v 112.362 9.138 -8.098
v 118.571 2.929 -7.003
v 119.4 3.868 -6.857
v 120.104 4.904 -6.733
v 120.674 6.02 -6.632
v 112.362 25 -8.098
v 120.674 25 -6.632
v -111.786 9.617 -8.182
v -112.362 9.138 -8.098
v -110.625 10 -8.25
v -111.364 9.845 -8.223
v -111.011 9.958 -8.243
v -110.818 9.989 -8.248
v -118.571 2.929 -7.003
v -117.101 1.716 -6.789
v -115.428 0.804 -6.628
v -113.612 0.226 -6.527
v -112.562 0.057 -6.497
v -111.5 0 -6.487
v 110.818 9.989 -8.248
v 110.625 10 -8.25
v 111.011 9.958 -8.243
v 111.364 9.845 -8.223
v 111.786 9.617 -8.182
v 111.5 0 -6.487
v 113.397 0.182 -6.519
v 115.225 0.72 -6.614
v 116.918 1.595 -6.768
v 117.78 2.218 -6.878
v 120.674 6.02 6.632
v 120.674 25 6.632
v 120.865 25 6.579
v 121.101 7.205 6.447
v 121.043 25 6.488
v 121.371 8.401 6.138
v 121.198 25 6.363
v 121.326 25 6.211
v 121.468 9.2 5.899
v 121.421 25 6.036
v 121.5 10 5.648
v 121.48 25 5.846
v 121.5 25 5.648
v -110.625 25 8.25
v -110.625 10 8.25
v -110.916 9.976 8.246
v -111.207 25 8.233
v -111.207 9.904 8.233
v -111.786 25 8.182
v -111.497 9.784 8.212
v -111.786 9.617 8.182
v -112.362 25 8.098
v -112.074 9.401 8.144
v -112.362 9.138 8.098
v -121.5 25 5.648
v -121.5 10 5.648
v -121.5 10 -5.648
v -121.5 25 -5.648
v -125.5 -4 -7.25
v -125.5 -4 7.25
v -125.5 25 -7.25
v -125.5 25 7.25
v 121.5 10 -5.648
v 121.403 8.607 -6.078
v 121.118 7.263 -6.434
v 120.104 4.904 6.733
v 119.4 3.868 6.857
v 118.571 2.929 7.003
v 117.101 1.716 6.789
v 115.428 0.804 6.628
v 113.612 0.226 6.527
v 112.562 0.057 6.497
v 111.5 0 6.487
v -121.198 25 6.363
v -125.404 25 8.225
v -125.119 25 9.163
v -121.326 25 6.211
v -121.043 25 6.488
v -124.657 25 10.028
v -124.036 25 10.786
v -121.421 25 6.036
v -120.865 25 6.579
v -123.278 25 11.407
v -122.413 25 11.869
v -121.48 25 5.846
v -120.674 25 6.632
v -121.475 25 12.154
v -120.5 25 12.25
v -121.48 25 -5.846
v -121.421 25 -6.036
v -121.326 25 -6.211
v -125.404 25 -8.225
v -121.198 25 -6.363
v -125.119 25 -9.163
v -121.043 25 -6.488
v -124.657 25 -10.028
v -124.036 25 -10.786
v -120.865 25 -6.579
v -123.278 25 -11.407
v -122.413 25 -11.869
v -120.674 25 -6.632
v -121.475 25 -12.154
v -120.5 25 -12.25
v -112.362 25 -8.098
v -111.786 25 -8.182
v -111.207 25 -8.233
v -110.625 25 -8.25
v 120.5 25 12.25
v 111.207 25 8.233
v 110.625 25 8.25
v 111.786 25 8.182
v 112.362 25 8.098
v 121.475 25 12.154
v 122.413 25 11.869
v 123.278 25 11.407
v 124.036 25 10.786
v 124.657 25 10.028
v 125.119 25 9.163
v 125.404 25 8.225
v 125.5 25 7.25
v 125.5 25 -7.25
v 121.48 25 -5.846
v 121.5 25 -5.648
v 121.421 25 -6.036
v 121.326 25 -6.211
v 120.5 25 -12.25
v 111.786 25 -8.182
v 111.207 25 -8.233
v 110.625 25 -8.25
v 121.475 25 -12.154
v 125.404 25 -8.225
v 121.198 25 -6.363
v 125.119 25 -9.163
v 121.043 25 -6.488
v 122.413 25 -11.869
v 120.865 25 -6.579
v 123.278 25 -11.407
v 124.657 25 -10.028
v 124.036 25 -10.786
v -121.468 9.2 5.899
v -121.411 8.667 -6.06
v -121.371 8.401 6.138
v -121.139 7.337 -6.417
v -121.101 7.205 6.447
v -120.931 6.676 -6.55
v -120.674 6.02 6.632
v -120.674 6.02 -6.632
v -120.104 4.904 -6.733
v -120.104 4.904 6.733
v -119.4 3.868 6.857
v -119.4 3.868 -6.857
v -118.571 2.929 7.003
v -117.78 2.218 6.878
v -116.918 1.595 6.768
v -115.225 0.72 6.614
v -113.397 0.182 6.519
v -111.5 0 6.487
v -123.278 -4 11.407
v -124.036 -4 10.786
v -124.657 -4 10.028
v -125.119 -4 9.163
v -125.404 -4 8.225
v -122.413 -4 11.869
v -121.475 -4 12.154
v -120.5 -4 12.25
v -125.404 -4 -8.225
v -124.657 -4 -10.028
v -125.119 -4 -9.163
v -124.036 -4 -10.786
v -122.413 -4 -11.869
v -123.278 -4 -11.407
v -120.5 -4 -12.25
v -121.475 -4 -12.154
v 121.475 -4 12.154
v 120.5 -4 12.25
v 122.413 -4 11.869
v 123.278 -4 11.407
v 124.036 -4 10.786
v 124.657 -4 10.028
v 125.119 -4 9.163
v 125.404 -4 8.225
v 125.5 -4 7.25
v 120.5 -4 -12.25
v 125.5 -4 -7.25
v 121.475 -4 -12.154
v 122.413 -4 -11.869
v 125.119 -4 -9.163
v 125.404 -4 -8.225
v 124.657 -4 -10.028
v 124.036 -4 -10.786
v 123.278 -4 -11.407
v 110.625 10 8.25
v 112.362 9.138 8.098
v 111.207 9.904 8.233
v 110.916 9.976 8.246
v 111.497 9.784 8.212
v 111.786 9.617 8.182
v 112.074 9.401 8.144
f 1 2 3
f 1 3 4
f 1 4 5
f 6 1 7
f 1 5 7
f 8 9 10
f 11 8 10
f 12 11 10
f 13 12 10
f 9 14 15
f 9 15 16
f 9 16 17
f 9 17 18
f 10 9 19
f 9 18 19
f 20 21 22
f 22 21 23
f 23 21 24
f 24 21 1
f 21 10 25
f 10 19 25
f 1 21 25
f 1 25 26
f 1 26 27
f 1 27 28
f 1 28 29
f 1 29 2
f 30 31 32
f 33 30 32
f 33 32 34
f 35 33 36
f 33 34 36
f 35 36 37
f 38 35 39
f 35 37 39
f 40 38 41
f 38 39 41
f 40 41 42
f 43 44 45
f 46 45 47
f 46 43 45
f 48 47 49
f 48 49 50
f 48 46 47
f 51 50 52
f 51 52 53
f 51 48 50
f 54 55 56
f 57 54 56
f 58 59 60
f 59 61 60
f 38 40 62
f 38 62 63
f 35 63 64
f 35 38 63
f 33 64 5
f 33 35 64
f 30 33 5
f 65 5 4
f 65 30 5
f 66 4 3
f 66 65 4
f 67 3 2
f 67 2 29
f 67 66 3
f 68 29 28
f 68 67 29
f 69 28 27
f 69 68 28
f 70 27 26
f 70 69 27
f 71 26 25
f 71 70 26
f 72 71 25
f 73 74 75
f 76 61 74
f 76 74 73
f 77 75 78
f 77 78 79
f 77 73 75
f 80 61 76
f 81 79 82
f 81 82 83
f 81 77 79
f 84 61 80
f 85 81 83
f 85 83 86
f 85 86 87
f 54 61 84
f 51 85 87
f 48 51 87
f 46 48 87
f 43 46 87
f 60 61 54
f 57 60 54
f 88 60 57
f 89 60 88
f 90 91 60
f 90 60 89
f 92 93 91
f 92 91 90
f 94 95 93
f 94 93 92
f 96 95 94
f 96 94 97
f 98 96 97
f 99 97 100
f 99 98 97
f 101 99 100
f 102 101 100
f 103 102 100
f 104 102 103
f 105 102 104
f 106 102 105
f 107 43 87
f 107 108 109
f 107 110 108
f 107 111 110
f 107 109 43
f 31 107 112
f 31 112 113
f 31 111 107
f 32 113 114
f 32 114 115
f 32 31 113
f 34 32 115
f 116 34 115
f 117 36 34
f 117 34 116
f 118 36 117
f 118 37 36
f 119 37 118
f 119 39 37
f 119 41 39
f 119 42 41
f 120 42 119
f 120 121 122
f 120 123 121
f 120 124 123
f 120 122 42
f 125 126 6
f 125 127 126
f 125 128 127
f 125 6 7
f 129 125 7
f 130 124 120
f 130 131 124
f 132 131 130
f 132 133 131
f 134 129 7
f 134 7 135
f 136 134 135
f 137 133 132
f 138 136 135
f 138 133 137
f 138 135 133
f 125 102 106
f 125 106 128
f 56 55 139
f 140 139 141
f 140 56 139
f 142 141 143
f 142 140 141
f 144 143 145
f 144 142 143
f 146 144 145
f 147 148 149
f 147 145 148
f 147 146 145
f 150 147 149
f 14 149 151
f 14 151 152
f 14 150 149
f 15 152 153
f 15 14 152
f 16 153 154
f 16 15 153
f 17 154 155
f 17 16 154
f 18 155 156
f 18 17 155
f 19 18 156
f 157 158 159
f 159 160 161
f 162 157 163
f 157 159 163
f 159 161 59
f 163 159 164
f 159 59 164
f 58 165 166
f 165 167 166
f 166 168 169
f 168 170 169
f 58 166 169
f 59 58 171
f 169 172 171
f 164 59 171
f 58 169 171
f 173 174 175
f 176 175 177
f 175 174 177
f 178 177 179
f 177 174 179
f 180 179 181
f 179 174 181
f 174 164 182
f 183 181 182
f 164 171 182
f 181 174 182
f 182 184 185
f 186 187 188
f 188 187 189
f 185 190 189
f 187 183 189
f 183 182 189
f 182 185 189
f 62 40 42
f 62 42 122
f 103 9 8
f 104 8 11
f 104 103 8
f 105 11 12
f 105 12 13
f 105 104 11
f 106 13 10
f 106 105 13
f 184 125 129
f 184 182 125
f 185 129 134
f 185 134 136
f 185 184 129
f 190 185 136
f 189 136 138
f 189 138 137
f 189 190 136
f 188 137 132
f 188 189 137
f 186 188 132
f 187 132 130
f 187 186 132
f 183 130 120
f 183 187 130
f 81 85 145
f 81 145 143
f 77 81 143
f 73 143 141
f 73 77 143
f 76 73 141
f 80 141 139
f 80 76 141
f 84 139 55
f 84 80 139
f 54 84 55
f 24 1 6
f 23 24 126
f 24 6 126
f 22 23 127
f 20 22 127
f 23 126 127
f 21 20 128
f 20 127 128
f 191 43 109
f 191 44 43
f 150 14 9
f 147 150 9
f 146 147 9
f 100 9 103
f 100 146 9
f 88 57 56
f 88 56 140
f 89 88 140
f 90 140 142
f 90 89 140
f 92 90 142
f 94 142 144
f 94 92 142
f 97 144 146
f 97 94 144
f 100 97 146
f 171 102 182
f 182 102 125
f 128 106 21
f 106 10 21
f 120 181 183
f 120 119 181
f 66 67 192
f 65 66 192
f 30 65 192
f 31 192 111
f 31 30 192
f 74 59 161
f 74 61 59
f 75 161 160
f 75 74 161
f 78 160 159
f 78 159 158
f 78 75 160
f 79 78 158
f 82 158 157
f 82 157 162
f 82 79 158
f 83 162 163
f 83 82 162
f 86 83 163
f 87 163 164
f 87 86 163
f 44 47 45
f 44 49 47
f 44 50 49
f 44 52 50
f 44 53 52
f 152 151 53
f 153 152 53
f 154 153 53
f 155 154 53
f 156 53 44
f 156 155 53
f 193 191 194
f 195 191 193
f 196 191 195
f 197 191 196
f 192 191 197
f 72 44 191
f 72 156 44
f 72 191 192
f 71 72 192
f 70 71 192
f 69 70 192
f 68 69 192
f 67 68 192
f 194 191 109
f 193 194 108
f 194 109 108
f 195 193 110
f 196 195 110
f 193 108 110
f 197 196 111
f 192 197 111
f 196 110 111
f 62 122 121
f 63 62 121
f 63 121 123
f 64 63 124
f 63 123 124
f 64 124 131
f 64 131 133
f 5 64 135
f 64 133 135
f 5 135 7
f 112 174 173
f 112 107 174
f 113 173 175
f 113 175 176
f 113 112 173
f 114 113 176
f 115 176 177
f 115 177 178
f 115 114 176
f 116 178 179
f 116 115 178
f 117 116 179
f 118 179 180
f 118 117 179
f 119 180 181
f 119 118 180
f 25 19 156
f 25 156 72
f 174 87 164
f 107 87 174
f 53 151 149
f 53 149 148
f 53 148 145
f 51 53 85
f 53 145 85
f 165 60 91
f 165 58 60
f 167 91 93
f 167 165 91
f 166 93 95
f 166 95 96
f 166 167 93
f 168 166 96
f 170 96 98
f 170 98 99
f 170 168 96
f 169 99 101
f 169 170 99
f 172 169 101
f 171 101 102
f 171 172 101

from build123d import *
from OCP.BRepFilletAPI import BRepFilletAPI_MakeChamfer

# Parameters (mm, degrees)
SKETCH1_W           = 251
SKETCH1_H           = 24.5
SKETCH1_W_2         = 243
SKETCH1_H_2         = 16.5
BOSS_EXTRUDE1_DEPTH = 25
SKETCH1_2_W         = 251
SKETCH1_2_H         = 24.5
BOSS_EXTRUDE2_DEPTH = 4
CHAMFER1_SIZE       = 10
CHAMFER1_SIZE2      = 1.763269807
FILLET1_R           = 10
FILLET2_R           = 1
FILLET4_R           = 10
FILLET5_R           = 5


with BuildPart() as part:
    # Sketch1 → Boss-Extrude1 (new body)
    with BuildSketch(Plane(origin=(0, 0, 0), x_dir=(1, 0, 0), z_dir=(0, 1, 0))):
        Rectangle(SKETCH1_W, SKETCH1_H)
        Rectangle(SKETCH1_W_2, SKETCH1_H_2, mode=Mode.SUBTRACT)
    extrude(amount=BOSS_EXTRUDE1_DEPTH)

    # Sketch1<2> → Boss-Extrude2 (add)
    with BuildSketch(Plane(origin=(0, 0, 0), x_dir=(1, 0, 0), z_dir=(0, 1, 0))):
        Rectangle(SKETCH1_2_W, SKETCH1_2_H)
    extrude(amount=-BOSS_EXTRUDE2_DEPTH)

    # Chamfer1: one chamfer whose edges measure the first distance from different faces: ONE call of the kernel's chamfer builder (chamfer() names one face for all edges)
    chamfer1_edges_1 = [part.edges().sort_by_distance(p)[0] for p in [
        (121.5, 12.5, 8.25),
        (0, 0, 8.25),
        (-121.5, 12.5, 8.25),
    ]]
    chamfer1_side_1 = [part.faces().sort_by_distance(p)[0] for p in [
        (0, 12.5, 8.25),
    ]]
    chamfer1_edges_2 = [part.edges().sort_by_distance(p)[0] for p in [
        (0, 0, -8.25),
        (121.5, 12.5, -8.25),
        (-121.5, 12.5, -8.25),
    ]]
    chamfer1_side_2 = [part.faces().sort_by_distance(p)[0] for p in [
        (0, 12.5, -8.25),
    ]]
    chamfer1 = BRepFilletAPI_MakeChamfer(part.part.solid().wrapped)
    for e in chamfer1_edges_1:
        chamfer1.Add(CHAMFER1_SIZE, CHAMFER1_SIZE2, e.wrapped, chamfer1_side_1[0].wrapped)  # the first distance lies on this face
    for e in chamfer1_edges_2:
        chamfer1.Add(CHAMFER1_SIZE, CHAMFER1_SIZE2, e.wrapped, chamfer1_side_2[0].wrapped)  # the first distance lies on this face
    add(Compound.cast(chamfer1.Shape()), mode=Mode.REPLACE)

    # Fillet1
    fillet1_edges = [part.edges().sort_by_distance(p)[0] for p in [
        (-111.5, 17.5, 8.25),
        (111.5, 17.5, 8.25),
        (111.5, 17.5, -8.25),
        (-111.5, 17.5, -8.25),
    ]]
    fillet(fillet1_edges, radius=FILLET1_R)

    # Fillet2
    fillet2_edges = [part.edges().sort_by_distance(p)[0] for p in [
        (121.5, 12.5, -6.486730193),
        (121.5, 12.5, 6.486730193),
        (-121.5, 12.5, -6.486730193),
        (-121.5, 12.5, 6.486730193),
    ]]
    fillet(fillet2_edges, radius=FILLET2_R)

    # Fillet4
    # the kernel refuses this fillet: 10 mm, written as the material it adds along each edge
    with BuildSketch(Plane(origin=(-121.5, 0, -30.647630562), x_dir=(0, 1, 0), z_dir=(0, 0, 1))) as fillet4_piece_1_section:
        with BuildLine():
            CenterArc((FILLET4_R, -FILLET4_R), FILLET4_R, 90, 90)
            Line((0, -FILLET4_R), (0, 0))
            Line((0, 0), (FILLET4_R, 0))
        make_face()
    fillet4_piece_1 = extrude(amount=61.295261123, mode=Mode.PRIVATE)
    fillet4_piece_1 = split(fillet4_piece_1, bisect_by=Plane(origin=(-119.266320611, 1.057029519, 6.673113017), z_dir=(0, 0.17364817766693139, -0.9848077530122079)), keep=Keep.TOP, mode=Mode.PRIVATE)
    fillet4_piece_1 = split(fillet4_piece_1, bisect_by=Plane(origin=(-119.266320611, 1.057029519, -6.673113017), z_dir=(0, 0.17364817766693139, 0.9848077530122079)), keep=Keep.TOP, mode=Mode.PRIVATE)
    add(fillet4_piece_1)
    with BuildSketch(Plane(origin=(121.5, 0, 30.647630562), x_dir=(0, 1, 0), z_dir=(0, 0, -1))) as fillet4_piece_2_section:
        with BuildLine():
            CenterArc((FILLET4_R, -FILLET4_R), FILLET4_R, 90, 90)
            Line((0, -FILLET4_R), (0, 0))
            Line((0, 0), (FILLET4_R, 0))
        make_face()
    fillet4_piece_2 = extrude(amount=61.295261123, mode=Mode.PRIVATE)
    fillet4_piece_2 = split(fillet4_piece_2, bisect_by=Plane(origin=(119.266320611, 1.057029519, 6.673113017), z_dir=(0, 0.17364817766693139, -0.9848077530122079)), keep=Keep.TOP, mode=Mode.PRIVATE)
    fillet4_piece_2 = split(fillet4_piece_2, bisect_by=Plane(origin=(119.266320611, 1.057029519, -6.673113017), z_dir=(0, 0.17364817766693139, 0.9848077530122079)), keep=Keep.TOP, mode=Mode.PRIVATE)
    add(fillet4_piece_2)

    # Fillet5
    fillet5_edges = [part.edges().sort_by_distance(p)[0] for p in [
        (-125.5, 10.5, -12.25),
        (125.5, 10.5, -12.25),
        (125.5, 10.5, 12.25),
        (-125.5, 10.5, 12.25),
    ]]
    fillet(fillet5_edges, radius=FILLET5_R)


solid = part.part
